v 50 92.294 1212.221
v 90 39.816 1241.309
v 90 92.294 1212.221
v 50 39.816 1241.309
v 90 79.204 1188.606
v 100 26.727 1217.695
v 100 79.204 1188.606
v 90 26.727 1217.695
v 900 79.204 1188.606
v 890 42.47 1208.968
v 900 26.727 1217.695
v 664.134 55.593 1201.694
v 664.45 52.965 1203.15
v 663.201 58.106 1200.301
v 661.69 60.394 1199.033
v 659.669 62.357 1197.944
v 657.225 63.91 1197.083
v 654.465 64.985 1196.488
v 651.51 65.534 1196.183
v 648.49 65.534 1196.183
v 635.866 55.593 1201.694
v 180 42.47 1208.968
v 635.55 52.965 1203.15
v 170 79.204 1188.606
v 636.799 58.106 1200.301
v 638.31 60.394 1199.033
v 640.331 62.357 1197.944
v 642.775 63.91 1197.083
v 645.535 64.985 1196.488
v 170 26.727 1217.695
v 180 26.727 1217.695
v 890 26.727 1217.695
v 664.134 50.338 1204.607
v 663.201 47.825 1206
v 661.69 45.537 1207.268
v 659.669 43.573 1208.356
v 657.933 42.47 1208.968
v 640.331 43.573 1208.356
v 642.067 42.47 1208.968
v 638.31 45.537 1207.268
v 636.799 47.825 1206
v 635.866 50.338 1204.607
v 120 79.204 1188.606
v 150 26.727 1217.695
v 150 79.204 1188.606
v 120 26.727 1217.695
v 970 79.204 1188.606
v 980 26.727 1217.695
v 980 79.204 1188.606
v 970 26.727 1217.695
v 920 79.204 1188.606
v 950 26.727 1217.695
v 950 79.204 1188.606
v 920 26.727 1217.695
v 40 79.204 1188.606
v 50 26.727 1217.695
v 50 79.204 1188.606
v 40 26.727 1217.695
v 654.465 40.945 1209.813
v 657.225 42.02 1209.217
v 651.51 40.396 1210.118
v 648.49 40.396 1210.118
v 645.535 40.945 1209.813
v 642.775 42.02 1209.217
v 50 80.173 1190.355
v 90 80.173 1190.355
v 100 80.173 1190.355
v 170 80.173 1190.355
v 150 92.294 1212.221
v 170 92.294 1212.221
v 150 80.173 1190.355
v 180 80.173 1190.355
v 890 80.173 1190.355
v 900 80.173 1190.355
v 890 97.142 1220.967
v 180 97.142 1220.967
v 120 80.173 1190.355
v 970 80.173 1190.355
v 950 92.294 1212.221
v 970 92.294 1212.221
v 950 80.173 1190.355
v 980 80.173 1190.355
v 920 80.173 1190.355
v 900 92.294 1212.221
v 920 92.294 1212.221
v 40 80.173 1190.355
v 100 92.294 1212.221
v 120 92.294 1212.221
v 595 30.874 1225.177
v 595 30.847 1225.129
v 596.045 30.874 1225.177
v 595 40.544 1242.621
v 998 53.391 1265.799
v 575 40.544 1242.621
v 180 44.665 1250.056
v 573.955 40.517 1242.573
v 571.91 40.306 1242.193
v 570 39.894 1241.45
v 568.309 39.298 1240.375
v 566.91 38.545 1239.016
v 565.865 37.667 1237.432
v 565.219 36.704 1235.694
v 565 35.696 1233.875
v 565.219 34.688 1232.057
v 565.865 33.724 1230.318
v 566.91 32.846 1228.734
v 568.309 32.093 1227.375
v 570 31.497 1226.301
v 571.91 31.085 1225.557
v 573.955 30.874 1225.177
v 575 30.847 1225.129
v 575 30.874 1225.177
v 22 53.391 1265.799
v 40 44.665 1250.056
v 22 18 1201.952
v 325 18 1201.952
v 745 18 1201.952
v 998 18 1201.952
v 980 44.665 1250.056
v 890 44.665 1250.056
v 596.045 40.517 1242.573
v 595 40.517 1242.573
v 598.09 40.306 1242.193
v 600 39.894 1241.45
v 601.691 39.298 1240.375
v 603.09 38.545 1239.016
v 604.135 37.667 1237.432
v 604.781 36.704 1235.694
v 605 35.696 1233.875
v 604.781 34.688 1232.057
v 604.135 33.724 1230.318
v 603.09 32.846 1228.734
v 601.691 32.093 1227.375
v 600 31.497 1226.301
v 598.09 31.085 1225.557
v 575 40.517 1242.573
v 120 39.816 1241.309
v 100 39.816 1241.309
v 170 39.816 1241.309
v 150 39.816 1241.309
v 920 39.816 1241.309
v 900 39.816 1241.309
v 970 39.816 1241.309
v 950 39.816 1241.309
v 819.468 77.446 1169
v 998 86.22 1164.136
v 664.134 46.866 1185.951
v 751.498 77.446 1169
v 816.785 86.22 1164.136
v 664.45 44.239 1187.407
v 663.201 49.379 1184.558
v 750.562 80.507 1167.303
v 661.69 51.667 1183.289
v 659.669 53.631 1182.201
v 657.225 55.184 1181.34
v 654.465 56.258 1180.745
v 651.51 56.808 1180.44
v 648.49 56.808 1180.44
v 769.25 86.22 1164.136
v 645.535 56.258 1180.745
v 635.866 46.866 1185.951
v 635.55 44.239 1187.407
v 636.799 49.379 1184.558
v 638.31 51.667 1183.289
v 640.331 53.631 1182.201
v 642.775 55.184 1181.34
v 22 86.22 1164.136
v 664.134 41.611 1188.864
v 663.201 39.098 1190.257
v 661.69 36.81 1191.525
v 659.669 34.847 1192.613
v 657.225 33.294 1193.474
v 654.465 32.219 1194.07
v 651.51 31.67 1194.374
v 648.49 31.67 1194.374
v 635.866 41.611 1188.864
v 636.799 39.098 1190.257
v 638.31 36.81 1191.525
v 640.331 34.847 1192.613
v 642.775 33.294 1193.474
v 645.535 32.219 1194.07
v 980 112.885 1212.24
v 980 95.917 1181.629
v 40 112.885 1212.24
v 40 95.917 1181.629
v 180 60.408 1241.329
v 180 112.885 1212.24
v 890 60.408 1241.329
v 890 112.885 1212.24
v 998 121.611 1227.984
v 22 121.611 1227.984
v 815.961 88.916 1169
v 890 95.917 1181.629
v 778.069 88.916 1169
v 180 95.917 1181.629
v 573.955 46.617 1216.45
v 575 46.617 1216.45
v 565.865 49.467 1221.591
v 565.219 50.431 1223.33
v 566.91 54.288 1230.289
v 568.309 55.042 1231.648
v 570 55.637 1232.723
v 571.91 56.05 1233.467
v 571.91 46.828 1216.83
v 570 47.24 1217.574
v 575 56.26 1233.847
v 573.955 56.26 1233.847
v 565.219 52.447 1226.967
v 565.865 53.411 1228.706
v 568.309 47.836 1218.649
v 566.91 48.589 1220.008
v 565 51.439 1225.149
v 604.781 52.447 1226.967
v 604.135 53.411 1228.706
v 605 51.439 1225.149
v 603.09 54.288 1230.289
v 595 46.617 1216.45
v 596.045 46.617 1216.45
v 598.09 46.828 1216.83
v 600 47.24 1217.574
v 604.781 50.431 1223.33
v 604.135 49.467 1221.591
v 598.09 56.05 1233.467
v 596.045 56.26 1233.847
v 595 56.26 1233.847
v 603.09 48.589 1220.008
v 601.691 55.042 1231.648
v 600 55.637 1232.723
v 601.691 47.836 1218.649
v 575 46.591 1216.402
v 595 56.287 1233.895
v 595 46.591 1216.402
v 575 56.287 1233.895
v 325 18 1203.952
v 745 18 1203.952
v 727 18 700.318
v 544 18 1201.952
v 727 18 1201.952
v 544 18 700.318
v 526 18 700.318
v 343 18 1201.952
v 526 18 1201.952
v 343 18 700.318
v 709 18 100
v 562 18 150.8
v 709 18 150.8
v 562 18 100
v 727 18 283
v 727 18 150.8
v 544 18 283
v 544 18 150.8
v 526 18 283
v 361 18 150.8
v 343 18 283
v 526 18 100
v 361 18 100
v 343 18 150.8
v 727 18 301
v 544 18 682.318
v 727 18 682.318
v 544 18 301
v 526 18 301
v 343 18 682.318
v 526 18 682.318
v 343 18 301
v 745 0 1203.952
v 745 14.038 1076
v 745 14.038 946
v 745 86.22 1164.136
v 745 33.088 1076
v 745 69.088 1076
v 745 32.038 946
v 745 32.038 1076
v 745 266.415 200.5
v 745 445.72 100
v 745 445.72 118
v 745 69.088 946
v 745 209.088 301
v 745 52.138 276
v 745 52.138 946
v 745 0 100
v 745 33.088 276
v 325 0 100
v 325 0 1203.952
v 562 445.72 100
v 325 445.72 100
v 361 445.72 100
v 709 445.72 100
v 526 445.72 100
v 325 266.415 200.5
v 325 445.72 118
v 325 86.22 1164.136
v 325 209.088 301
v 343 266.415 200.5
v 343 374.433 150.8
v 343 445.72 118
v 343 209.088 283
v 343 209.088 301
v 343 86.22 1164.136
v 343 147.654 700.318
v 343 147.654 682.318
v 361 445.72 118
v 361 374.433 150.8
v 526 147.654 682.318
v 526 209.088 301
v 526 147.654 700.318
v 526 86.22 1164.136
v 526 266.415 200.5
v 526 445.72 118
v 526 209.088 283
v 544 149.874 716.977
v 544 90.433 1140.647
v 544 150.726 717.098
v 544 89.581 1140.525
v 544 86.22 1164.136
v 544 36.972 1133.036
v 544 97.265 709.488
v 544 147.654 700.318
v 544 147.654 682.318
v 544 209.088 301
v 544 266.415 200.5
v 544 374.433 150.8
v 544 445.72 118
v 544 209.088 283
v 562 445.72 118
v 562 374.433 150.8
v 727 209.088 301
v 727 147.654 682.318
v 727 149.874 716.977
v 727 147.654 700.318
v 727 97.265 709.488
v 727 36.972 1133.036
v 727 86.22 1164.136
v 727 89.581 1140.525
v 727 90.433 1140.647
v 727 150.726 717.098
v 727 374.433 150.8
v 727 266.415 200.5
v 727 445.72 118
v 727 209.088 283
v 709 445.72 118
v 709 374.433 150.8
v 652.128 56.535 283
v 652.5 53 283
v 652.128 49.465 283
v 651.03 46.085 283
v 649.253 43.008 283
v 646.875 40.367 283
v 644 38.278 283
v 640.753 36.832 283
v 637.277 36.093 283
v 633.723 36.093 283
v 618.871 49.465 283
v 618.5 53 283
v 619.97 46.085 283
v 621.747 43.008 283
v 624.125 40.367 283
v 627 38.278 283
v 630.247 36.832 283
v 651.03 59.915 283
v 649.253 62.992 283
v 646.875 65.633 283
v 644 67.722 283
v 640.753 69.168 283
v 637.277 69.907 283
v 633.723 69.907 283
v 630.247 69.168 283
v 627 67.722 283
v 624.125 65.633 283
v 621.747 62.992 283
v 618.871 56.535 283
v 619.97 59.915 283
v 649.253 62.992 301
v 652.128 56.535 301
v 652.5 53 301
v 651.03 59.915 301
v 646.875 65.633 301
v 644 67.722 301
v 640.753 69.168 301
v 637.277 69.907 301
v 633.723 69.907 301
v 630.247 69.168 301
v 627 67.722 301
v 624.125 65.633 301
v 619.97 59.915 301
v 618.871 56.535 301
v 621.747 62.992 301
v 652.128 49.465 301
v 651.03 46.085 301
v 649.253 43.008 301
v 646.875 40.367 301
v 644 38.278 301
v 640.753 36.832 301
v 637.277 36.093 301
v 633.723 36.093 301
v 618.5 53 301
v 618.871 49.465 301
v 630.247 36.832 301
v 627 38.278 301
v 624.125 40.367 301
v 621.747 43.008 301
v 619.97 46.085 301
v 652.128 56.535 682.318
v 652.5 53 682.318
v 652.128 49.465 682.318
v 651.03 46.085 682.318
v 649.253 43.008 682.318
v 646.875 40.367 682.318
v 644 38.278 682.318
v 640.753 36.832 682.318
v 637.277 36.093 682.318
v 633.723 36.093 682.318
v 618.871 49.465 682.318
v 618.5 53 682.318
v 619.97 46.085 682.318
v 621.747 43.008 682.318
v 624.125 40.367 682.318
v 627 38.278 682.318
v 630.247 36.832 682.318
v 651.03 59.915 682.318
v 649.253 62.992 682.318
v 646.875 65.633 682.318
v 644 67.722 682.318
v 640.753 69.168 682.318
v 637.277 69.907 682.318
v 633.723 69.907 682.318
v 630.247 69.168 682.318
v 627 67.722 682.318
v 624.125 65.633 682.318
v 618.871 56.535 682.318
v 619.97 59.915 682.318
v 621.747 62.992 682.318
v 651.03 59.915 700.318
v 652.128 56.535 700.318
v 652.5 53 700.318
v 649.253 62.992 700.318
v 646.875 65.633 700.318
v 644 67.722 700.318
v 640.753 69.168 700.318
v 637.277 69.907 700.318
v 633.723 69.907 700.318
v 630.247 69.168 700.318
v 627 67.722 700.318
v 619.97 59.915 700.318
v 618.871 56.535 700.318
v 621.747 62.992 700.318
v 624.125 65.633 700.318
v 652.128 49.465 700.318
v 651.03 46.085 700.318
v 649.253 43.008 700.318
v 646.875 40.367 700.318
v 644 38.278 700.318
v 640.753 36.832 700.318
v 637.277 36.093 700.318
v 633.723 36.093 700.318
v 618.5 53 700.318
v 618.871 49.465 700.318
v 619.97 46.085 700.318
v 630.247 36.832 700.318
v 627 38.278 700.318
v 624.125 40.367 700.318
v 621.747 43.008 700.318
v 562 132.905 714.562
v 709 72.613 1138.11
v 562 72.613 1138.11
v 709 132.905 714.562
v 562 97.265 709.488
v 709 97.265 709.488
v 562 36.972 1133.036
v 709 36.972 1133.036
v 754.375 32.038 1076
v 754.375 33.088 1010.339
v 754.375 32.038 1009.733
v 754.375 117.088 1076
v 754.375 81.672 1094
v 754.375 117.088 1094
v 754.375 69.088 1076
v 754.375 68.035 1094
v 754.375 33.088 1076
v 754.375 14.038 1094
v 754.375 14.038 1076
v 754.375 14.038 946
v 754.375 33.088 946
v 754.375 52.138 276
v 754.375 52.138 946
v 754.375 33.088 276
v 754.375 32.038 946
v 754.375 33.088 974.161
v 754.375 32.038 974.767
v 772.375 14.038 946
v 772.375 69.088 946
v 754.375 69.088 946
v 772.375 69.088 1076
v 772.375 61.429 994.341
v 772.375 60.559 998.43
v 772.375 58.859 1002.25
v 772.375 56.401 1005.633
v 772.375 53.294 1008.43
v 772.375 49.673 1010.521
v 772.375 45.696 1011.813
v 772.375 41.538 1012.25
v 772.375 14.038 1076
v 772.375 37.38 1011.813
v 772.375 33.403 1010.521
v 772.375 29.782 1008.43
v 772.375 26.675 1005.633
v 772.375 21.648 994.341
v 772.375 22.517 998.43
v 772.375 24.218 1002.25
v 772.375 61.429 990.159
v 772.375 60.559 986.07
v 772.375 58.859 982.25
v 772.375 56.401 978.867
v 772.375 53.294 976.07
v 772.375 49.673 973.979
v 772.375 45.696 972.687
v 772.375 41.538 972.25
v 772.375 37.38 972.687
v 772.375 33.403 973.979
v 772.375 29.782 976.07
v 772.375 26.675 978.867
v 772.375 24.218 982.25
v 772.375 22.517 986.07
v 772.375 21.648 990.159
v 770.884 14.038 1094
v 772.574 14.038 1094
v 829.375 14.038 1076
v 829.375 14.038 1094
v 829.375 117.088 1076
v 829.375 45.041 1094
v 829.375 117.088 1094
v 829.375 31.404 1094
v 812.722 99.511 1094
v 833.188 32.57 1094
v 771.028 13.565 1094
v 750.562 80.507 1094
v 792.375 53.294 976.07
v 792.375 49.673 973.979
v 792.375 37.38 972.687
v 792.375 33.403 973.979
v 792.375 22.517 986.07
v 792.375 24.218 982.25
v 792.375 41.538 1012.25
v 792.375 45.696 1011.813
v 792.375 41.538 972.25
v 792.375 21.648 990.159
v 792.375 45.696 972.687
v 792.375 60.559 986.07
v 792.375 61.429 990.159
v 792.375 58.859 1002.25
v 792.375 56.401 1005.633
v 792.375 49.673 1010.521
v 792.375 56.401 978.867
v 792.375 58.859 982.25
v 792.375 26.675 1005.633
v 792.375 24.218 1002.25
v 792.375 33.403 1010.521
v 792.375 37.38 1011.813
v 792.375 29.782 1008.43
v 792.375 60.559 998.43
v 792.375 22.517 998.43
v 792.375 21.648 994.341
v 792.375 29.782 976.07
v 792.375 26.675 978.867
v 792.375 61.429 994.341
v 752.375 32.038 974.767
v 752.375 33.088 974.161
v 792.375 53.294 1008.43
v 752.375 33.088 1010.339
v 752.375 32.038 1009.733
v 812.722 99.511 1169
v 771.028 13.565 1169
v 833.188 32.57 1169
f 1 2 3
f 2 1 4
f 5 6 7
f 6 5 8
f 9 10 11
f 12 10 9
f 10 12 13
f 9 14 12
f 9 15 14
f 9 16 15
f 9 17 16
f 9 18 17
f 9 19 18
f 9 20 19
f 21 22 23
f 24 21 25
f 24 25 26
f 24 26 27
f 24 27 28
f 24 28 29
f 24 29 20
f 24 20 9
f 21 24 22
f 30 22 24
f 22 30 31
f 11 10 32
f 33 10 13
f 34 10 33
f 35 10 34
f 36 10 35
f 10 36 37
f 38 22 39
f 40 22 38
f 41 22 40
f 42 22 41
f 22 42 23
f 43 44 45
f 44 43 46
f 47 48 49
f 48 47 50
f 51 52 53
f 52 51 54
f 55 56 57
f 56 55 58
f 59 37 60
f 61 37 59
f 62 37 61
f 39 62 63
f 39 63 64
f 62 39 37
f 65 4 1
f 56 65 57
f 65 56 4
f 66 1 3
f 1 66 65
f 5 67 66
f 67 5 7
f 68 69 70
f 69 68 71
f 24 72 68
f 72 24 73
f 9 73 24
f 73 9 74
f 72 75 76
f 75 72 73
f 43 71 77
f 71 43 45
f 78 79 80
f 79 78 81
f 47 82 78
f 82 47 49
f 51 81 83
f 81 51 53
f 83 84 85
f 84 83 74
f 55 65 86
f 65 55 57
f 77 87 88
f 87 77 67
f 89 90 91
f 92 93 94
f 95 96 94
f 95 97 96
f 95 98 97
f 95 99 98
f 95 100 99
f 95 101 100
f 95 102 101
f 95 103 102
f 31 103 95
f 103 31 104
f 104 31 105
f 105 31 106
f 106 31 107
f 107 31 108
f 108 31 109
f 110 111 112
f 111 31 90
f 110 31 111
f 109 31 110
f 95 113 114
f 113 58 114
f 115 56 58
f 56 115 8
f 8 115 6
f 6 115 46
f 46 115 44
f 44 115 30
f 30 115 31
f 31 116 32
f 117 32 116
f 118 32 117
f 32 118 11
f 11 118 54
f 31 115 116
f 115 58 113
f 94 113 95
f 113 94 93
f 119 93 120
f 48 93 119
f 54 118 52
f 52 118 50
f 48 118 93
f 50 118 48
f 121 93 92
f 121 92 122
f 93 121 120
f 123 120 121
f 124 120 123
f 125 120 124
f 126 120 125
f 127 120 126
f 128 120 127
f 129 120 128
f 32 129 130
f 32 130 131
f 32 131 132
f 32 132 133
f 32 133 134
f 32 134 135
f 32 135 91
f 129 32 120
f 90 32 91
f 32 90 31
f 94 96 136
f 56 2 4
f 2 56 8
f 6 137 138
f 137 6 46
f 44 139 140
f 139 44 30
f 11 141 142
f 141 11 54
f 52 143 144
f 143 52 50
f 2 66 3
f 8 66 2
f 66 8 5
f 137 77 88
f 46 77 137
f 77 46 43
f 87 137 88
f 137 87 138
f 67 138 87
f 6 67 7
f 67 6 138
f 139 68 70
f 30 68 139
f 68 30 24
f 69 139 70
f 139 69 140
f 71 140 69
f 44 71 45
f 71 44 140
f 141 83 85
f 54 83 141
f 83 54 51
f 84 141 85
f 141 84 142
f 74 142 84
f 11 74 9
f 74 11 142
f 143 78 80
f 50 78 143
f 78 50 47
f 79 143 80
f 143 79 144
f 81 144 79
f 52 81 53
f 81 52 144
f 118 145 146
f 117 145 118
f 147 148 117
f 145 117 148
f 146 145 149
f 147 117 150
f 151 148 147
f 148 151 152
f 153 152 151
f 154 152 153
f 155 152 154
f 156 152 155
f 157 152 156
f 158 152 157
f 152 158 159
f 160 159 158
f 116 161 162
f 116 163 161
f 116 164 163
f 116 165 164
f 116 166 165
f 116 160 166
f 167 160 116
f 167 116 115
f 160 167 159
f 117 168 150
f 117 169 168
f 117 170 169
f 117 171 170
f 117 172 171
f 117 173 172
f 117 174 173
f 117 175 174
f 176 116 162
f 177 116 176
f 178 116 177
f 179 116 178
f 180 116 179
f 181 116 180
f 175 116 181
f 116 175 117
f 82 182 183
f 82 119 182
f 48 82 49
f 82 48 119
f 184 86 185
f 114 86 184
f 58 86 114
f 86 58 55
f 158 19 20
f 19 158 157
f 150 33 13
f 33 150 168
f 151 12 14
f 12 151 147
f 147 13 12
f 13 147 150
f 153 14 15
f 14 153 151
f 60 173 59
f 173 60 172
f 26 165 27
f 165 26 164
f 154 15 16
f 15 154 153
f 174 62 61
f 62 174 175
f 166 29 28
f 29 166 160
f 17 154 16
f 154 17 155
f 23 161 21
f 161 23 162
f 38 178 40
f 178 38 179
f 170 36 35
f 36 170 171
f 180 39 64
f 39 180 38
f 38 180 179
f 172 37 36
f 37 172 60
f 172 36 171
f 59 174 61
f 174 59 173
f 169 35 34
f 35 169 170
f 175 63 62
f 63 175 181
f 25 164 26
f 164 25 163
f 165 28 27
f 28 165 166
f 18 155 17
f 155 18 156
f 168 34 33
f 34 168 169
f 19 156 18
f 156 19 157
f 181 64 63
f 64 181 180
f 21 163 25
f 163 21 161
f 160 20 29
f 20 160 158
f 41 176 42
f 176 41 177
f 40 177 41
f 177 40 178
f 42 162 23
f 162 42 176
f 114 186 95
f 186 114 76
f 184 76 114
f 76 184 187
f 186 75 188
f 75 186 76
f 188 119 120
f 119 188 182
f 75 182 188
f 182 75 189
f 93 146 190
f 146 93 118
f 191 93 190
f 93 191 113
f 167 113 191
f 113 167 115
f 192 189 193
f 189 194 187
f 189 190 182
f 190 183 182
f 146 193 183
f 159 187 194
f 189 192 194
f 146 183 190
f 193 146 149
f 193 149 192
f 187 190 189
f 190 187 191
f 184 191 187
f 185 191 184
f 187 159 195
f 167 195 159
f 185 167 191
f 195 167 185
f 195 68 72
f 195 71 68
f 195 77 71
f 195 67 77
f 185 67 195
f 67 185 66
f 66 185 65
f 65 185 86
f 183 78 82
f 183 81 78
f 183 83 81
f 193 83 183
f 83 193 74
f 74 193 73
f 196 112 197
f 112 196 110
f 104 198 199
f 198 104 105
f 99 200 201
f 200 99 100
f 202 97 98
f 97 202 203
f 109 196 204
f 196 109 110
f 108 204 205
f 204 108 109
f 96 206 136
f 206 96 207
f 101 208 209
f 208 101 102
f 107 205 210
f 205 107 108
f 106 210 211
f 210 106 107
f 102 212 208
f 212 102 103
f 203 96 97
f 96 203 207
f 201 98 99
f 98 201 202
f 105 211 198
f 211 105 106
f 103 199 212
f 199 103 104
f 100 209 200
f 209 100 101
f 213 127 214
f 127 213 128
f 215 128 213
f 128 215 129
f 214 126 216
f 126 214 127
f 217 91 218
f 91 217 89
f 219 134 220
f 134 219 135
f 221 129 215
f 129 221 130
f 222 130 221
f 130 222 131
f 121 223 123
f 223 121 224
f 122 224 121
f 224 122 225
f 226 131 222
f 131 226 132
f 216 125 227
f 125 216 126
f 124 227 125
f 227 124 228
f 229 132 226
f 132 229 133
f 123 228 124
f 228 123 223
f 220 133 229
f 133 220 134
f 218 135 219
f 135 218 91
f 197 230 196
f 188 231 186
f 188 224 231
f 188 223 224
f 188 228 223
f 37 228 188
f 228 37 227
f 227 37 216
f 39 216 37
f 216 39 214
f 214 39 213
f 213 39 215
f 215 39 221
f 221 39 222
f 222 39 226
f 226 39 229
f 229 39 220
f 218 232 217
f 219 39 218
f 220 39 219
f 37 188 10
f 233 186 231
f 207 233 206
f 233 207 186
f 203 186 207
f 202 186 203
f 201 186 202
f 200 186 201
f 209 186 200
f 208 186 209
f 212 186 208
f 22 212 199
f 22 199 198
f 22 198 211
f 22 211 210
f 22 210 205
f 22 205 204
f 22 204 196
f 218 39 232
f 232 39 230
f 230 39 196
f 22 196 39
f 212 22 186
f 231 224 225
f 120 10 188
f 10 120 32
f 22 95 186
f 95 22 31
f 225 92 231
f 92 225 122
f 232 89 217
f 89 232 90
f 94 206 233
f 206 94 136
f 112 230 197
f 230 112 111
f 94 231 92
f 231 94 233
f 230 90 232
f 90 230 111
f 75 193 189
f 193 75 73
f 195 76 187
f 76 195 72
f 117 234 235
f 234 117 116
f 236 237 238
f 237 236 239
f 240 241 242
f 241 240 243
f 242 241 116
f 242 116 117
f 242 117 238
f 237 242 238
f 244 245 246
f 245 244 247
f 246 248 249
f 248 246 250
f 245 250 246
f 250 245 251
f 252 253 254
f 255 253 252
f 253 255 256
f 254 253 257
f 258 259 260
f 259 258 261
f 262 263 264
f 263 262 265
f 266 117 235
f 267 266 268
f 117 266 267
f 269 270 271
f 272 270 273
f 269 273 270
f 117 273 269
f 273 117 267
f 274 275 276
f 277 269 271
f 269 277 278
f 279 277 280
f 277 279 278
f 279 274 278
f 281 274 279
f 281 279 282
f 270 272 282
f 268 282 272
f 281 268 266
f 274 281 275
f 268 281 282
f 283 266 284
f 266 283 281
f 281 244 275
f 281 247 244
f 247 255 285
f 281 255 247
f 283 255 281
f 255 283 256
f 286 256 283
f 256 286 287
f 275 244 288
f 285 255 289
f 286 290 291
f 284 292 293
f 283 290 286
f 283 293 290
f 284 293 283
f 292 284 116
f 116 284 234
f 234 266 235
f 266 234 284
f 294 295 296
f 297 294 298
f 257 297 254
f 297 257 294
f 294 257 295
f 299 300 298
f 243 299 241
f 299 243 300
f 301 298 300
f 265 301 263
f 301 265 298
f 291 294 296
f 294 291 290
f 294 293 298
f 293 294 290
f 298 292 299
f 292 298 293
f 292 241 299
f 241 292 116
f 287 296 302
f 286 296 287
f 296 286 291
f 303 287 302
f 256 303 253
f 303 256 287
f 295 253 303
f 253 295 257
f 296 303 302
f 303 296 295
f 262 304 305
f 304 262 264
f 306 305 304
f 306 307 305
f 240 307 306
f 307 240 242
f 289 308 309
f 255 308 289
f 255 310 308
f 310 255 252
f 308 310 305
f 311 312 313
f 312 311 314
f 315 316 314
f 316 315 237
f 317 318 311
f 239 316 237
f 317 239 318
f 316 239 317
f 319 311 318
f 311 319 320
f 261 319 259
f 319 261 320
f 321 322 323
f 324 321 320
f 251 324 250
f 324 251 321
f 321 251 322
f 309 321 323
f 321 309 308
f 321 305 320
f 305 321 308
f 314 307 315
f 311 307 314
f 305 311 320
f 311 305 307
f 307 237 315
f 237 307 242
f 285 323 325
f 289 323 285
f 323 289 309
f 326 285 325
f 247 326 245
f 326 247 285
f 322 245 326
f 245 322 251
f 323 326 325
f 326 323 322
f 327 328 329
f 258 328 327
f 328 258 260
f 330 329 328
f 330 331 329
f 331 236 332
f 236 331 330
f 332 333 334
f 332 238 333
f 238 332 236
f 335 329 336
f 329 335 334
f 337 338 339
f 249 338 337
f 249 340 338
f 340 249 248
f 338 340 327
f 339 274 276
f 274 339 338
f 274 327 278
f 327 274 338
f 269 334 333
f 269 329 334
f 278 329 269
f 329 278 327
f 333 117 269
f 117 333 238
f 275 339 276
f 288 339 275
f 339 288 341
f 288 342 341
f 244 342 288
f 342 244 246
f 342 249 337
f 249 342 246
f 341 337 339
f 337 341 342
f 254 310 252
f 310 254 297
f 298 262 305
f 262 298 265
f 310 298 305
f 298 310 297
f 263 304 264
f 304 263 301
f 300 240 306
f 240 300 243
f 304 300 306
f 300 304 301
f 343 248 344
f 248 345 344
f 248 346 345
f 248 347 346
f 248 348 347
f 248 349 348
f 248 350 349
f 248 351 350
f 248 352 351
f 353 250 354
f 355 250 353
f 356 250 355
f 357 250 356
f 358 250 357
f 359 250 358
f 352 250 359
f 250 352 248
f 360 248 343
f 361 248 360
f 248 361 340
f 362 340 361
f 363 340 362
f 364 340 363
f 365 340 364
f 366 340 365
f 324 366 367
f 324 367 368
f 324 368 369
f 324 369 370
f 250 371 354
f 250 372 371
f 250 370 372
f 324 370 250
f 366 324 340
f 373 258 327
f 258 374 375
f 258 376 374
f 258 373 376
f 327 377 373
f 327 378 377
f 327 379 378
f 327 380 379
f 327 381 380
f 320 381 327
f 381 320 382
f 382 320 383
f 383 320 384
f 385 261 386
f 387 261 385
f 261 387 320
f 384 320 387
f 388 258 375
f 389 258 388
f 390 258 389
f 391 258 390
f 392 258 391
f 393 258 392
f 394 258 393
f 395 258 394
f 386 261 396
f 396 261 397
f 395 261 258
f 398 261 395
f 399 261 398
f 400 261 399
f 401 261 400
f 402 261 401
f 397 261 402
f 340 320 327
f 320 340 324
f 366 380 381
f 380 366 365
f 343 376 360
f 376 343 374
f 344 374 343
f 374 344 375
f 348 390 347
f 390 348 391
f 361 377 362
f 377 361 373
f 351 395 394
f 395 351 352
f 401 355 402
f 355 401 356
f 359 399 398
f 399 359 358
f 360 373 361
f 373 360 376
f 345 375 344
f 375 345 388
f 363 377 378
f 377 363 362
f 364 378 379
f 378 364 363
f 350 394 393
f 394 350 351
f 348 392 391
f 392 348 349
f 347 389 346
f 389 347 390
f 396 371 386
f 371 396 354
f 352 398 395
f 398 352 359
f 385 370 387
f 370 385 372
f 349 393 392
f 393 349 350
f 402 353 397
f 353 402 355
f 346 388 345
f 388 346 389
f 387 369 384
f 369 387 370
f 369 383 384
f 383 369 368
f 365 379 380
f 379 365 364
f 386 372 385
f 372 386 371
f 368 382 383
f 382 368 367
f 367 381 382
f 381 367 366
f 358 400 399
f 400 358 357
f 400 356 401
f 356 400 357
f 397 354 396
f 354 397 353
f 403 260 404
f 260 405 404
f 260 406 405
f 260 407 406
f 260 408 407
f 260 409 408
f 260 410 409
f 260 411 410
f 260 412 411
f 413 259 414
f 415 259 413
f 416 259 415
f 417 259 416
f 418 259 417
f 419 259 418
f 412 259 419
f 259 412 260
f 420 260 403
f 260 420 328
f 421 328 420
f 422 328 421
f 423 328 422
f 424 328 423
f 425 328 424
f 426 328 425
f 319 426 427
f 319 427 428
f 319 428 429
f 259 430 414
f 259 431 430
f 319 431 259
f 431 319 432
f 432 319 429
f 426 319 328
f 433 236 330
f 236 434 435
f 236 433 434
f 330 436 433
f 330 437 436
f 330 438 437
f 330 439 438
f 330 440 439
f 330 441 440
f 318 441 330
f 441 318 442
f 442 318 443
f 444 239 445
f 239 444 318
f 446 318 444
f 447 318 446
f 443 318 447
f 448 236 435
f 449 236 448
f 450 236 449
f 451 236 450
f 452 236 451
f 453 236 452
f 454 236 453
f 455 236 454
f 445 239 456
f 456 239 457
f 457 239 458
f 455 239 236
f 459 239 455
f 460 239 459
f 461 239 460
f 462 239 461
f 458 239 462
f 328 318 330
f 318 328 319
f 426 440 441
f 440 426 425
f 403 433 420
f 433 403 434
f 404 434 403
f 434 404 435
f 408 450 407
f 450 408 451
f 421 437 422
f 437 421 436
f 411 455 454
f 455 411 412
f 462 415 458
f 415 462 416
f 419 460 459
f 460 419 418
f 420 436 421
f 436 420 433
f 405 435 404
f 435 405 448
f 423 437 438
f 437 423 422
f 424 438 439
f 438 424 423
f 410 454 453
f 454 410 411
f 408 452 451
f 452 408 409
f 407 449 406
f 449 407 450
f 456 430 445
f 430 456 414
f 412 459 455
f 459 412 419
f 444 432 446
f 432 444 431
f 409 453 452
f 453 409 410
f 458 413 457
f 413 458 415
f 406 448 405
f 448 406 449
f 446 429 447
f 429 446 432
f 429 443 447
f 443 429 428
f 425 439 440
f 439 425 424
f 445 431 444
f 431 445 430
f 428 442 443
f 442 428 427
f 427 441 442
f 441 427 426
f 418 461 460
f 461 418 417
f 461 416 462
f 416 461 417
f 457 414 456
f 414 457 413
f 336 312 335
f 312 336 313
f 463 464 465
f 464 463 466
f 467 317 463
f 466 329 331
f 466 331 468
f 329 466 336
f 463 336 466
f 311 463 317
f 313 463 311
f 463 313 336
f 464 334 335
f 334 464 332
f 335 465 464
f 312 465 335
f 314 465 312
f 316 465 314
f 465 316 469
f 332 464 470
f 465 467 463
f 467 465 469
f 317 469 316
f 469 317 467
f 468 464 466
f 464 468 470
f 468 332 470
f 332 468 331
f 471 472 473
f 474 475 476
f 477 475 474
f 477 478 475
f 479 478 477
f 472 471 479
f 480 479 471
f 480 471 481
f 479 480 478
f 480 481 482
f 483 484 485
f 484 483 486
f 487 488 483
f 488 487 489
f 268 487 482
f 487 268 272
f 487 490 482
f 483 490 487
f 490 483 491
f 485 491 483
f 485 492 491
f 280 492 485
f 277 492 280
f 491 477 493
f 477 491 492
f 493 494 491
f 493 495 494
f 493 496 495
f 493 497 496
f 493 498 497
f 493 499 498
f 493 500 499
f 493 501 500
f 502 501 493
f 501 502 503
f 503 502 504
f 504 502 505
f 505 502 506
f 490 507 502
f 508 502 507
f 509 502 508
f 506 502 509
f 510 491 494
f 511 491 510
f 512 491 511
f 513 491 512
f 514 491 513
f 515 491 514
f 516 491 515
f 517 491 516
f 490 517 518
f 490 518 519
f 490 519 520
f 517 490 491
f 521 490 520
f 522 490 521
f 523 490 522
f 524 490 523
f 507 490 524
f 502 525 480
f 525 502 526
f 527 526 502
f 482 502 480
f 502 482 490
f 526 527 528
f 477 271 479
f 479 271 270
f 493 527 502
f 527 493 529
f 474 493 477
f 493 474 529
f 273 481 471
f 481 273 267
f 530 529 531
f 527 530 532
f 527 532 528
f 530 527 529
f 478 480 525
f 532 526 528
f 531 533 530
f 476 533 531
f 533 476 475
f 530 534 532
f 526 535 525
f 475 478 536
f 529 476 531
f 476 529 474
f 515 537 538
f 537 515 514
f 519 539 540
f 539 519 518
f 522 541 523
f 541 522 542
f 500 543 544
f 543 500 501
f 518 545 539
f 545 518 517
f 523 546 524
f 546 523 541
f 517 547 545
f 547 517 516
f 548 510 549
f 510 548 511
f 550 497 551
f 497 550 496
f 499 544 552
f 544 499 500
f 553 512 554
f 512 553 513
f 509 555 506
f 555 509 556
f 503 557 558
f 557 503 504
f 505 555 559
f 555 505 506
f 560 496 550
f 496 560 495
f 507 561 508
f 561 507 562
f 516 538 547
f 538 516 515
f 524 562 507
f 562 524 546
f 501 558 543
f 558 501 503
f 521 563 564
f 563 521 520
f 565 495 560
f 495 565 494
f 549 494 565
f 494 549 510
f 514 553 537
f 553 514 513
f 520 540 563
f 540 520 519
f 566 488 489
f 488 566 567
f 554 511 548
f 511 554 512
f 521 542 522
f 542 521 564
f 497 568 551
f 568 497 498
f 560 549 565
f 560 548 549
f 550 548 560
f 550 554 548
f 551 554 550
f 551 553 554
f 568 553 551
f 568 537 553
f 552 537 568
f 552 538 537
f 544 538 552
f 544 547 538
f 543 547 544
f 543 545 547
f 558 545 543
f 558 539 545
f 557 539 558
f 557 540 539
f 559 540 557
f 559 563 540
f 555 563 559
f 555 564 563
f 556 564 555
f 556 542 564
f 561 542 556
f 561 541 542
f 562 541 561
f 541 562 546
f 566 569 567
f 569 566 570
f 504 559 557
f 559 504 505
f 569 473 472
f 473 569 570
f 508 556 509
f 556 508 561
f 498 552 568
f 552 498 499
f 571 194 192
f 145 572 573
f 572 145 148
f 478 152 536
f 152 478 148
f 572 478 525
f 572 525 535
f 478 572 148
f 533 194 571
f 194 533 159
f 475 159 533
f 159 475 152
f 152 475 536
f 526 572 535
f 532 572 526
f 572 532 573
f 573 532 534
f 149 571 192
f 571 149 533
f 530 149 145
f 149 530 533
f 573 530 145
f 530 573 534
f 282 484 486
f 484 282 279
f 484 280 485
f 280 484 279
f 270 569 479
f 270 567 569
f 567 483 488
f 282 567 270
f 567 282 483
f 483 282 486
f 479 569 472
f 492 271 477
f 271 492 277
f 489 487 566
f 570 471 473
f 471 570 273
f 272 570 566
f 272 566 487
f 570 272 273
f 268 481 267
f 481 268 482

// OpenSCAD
// file: params.scad
sheet_thickness=18;				// thickness of the plywood sheet.
milling_bit=10;                 // size of the milling it (3/8 ~= 10mm)

laser_width=20;					// width of the laser
laser_height=27;				// height of the laser
laser_origin_height=16;			// center of the laser beam
laser_length=60;				// length of the laser (includes cable allowance).
laser_spread_angle = 2*atan((110/2)/60);	// angle the laser spreads out from origin.
plug_diameter = 34;

laser_setback        =  48.45*10-75;	// how much the laser is set back from the center of the bike.
laser_position_z     = 119.26*10-90;	// height of the laser center.
laser_position_angle =  29;		// angle the laser points down.

laser_low = 50;
laser_high=1350;

laser_y = laser_length;

wheel_width=34;					// maximum width of a wheel (space between the wheel channels).
wheel_height=670;				// height of a 700CC wheel.

handlebar_width_max = 500;
channel_offset = handlebar_width_max / 2 + 20;
channel_thickness = 50;         // Thickness of the channels on either side of the week_width.

base_length=1500;

hb_85=50+laser_width/2;			// position of handlebar 85cm line (centered on laser)
hb_83=hb_85+20;					// position of handlebar 83cm line
hb_80=hb_85+50;					// position of handlebar 80cm line
hb_75=hb_80+50;					// position of handlebar 75cm line

bb_0=hb_75+750;					// position of bottom bracket line
bb_5=bb_0+50;					// position of bottom bracket +5cm line

// castor dimensions GD-60F (2" wheel, leveling castor).
castor_height = 82;
castor_radius = 61;
castor_plate = 73;

// bottom of the jig from the floor.
base_bottom = sheet_thickness + castor_height;

tab_height = 2*25.4;	// Height of the tabs to attach the column and back.

// utility functions.

function rotate_point(p,a) = [p[0]*cos(a) - p[1]*sin(a), p[0]*sin(a) + p[1]*cos(a)];

// output the sheet thickness so export.py knows how to created the files.
echo( sheet_thickness=sheet_thickness );

// Global flag indicating to color the parts and background.
color_parts = true;
// file: thickness.scad
include <params.scad>
include <lasercut/lasercut.scad>

module thickness_in_z( thickness ) {
	children();
}

module thickness_in_y( thickness ) {
	translate( [0, thickness, 0] )
	rotate( [90,0,0] )
	children();
}

module thickness_in_x( thickness ) {
	rotate( [90,0,90] )
	children();
}

module cutCube(cube,
        simple_tabs=[], simple_tab_holes=[], 
        captive_nuts=[], captive_nut_holes = [],
        finger_joints = [],
        bumpy_finger_joints = [],
        screw_tabs=[], screw_tab_holes=[],
        twist_holes=[], twist_connect=[],
        clips=[], clip_holes=[],
        circles_add = [],
        circles_remove = [],
        slits = [],
        cutouts = [],
        cutouts_vb = [],
        flat_adjust = [],
        milling_bit = milling_bit
) {
    transVal = cube[1] == sheet_thickness ? [0,sheet_thickness,0] : [0,0,0];
    rotVal = cube[0] == sheet_thickness ? [90,0,90] : cube[1] == sheet_thickness ? [90,0,0] : [0,0,0];
    
    values = [ for( v = cube ) if( v != sheet_thickness ) v ];
    
    translate( transVal )
    rotate( rotVal )
    lasercutoutSquare(
        thickness=sheet_thickness,
        x=values[0], y=values[1],
        simple_tabs = simple_tabs, 
        simple_tab_holes = simple_tab_holes, 
        captive_nuts = captive_nuts, 
        captive_nut_holes = captive_nut_holes,
        finger_joints = finger_joints,
        bumpy_finger_joints = bumpy_finger_joints,
        screw_tabs= screw_tabs, screw_tab_holes= screw_tab_holes,
        twist_holes=twist_holes, twist_connect=twist_connect,
        clips=clips, clip_holes=clip_holes,
        circles_add = circles_add,
        circles_remove = circles_remove,
        slits = slits,
        cutouts = cutouts,
        cutouts_vb = cutouts_vb,
        flat_adjust = flat_adjust,
        milling_bit = milling_bit
    );
}

module cutPoints(points,
        simple_tabs=[], simple_tab_holes=[], 
        captive_nuts=[], captive_nut_holes = [],
        finger_joints = [],
        bumpy_finger_joints = [],
        screw_tabs=[], screw_tab_holes=[],
        twist_holes=[], twist_connect=[],
        clips=[], clip_holes=[],
        circles_add = [],
        circles_remove = [],
        slits = [],
        cutouts = [],
        cutouts_vb = [],
        flat_adjust = [],
        milling_bit = milling_bit
) {
    lasercutout(
        thickness=sheet_thickness,
        points=points,
        simple_tabs = simple_tabs, 
        simple_tab_holes = simple_tab_holes, 
        captive_nuts = captive_nuts, 
        captive_nut_holes = captive_nut_holes,
        finger_joints = finger_joints,
        bumpy_finger_joints = bumpy_finger_joints,
        screw_tabs= screw_tabs, screw_tab_holes= screw_tab_holes,
        twist_holes=twist_holes, twist_connect=twist_connect,
        clips=clips, clip_holes=clip_holes,
        circles_add = circles_add,
        circles_remove = circles_remove,
        slits = slits,
        cutouts = cutouts,
        cutouts_vb = cutouts_vb,
        flat_adjust = flat_adjust,
        milling_bit = milling_bit
    );
}
// file: lasers.scad
include <params.scad>
include <thickness.scad>

show_laser_lines = false;

laser_clearance = 10;   // Clearance around the laser modules.
lasers_x = hb_85-laser_width/2-laser_clearance-sheet_thickness;
lasers_margin = laser_width/2+laser_clearance+sheet_thickness;
lasers_length = (bb_5-hb_85)+2*lasers_margin;
lasers_height = sheet_thickness*2 + laser_height + laser_clearance;
lasers_width = laser_length+sheet_thickness;

lasers_back_yz = rotate_point( [-laser_length, -laser_origin_height-sheet_thickness],
                    -laser_position_angle );
lasers_front_yz = rotate_point( [sheet_thickness, -laser_origin_height-sheet_thickness],
                    -laser_position_angle );
                    
lasers_effective_width = abs(lasers_back_yz[0]-lasers_front_yz[0]);

base_width =
    sheet_thickness +
    abs(lasers_back_yz[0]) + laser_setback +
    channel_offset +
    sheet_thickness;
 
back_height_over = 5;
back_height=(laser_setback + channel_offset) * tan(laser_spread_angle/2 - laser_position_angle) + laser_position_z + back_height_over;
    
channel_center = base_width - sheet_thickness + channel_offset;

module lasers() {
    translate( [lasers_x, sheet_thickness+abs(lasers_back_yz[0]), base_bottom+laser_position_z] )
    rotate( [-laser_position_angle, 0, 0] )
    translate( [0,-(lasers_width-sheet_thickness),-(laser_origin_height+sheet_thickness)] ) {
        // Draw the laser modules.
        laser_start = sheet_thickness+laser_clearance;
        laser = [laser_width, laser_length, laser_height];
        translate( [laser_start, 0, sheet_thickness] ) {
            lps = [hb_85-hb_85, hb_83-hb_85, hb_80-hb_85, hb_75-hb_85, bb_0-hb_85, bb_5-hb_85];
            for( lp = lps ) {
                translate( [lp, 0, 0] )
                color( [1,.5,0] )
                cube( laser );
            }
        }
        
        color( [.9,.9,.9] ) {
            //------------------------------------------
            lasers_bottom = [lasers_length-sheet_thickness*2, laser_length, sheet_thickness];
            echo( lasers_bottom=lasers_bottom );
            
            translate( [sheet_thickness, 0, 0] )
            cutCube(
                lasers_bottom,
                circles_remove = [[0.85*plug_diameter/2, bb_0-300, lasers_bottom[1]/2]]
            );
            
            //------------------------------------------
            lasers_top = [lasers_length, lasers_width, sheet_thickness];
            echo( lasers_top=lasers_top );
            
            translate( [0, 0, lasers_height-sheet_thickness] )
            cutCube( lasers_top );
            
            //------------------------------------------
            lip = 2;
            lasers_front = [lasers_length-sheet_thickness*2, sheet_thickness, sheet_thickness+lip];
            echo( lasers_front=lasers_front );

            translate( [sheet_thickness, lasers_width-sheet_thickness, 0] )
            cutCube( lasers_front );
            
            //------------------------------------------
            lasers_end = [sheet_thickness, lasers_width, lasers_height-sheet_thickness];
            echo( "2x", lasers_end=lasers_end );
            
            translate( [0,0,0] )
            cutCube( lasers_end );

            translate( [lasers_length-sheet_thickness,0,0] )
            cutCube( lasers_end );
 
            //------------------------------------------
            laser_side_start = lasers_margin + (hb_75 - hb_85) + laser_width/2 + laser_clearance;
            laser_side_end = lasers_length - lasers_margin - (bb_5-bb_0) - laser_width/2 - laser_clearance;
            laser_side = [laser_side_end-laser_side_start, sheet_thickness, lasers_height-sheet_thickness*2];
            
            echo( laser_side_start=laser_side_start );
            echo( "2x", laser_side=laser_side );
            
            control_radius = 20.0/2;
            control_tab_start = laser_side[0]/2+40;
            control_tab_end = control_tab_start + control_radius*2;
            translate( [laser_side_start, 0, sheet_thickness] )
            cutCube( laser_side,
                    circles_remove = [[control_radius, control_tab_start, laser_side[2]/2],
                    [control_radius, control_tab_end, laser_side[2]/2]
                    ],
                    cutouts=[
                        [control_tab_start,laser_side[2]/2-control_radius,control_tab_end-control_tab_start,control_radius*2 ],
                    ]
            );
            translate( [laser_side_start, lasers_width-sheet_thickness, sheet_thickness] )
            cutCube( laser_side );
        }
    }
}

module laser_lines() {
	a = laser_spread_angle/2+laser_position_angle;
	base_intersect = laser_position_z / tan( a );
	points = [
		[0,0],
		[-laser_position_z, base_intersect],
		[-laser_position_z, laser_setback + channel_offset],
		[back_height-laser_position_z-back_height_over, laser_setback + channel_offset],
	];
    y = base_width - sheet_thickness - channel_offset - laser_setback;  
    x = lasers_x+sheet_thickness+laser_clearance+laser_width/2;
    echo( laser_85=x ); // Position of 85cm laser from left edge.
	color( [0,1,0,.05] ) {
        translate( [x, y, laser_position_z + base_bottom] )
		for( lp = [hb_85-hb_85, hb_83-hb_85, hb_80-hb_85, hb_75-hb_85, bb_0-hb_85, bb_5-hb_85] ) {
			translate( [lp, 0, 0] )
			rotate( a=[0,270,0] )
			linear_extrude( height=1 )
			polygon( points );
		}
	}
}

lasers();
if( show_laser_lines ) {
	laser_lines();
}
// main file
include <lasers.scad>
include <thickness.scad>
include <lasercut/lasercut.scad>

laser_reveal = 165;
column_width = bb_0 - hb_75 - laser_reveal * 2;
column_height = laser_position_z+lasers_back_yz[1];

column_x = (bb_0+hb_75-column_width)/2;

laser_level_spread_angle = 110;

module horizontal_laser_line() {
	a = laser_level_spread_angle/2;
    y = 1000 * tan(a);
	points = [
		[0,0],
		[-y, 1000],
		[y, 1000],
	];
	color( [0,1,0,.05] ) {
        linear_extrude( height=1 )
        polygon( points );
	}
}

module horizontal_laser( x, p_bottom, p_top ) {
    track = [3/8*25, 3/4*25.4, 800];
    laser = [65, 70, 75];
    bolt_xy = [65/2, 40];
    laser_height = 45;
    
    rail_length = 130;
    shuttle_rail = [track[0], sheet_thickness, rail_length];
    shuttle_top = [sheet_thickness, sheet_thickness*2+track[1], shuttle_rail[2]];
    shelf_border = 10;
    laser_shelf = [laser[0]+shelf_border, laser[2]+shelf_border,sheet_thickness];
    shuttle_extension = [laser_shelf[0],sheet_thickness,100];
    shuttle_shelf = [laser[0]+shelf_border, shuttle_top[1]+30+sheet_thickness, sheet_thickness];
    
    dx = p_top[0] - p_bottom[0];
    dy = p_top[1] - p_bottom[1];
    angle = 0;
    
    fraction = 0.0;
    p_bottom_new = [p_bottom[0] + dx*fraction-140, p_bottom[1] + dy*fraction-25];
    
    echo( "shuttle_angle=", angle );
    echo( "shuttle_height=", p_bottom_new[0] );
    
    echo( "2x", shuttle_rail=shuttle_rail );
    echo( shuttle_top=shuttle_top );
    echo( shuttle_extension=shuttle_top );
    echo( laser_shelf=laser_shelf );
    echo( shuttle_shelf=shuttle_shelf );
        
    translate( [x,p_bottom_new[0],base_bottom+p_bottom_new[1]] ) {
        rotate( [angle,0,0] ) {
            color( [.25,.25,1] )
            translate( [0,-sheet_thickness, 0] )
            cube( track );
            
            //shuttle_height = track[2]/2;
            shuttle_height = track[2] - shuttle_rail[2];
            
            color( [.5,.5,.5] )
            translate( [0,0, shuttle_height] )
            cube( shuttle_rail );
                
            color( [.5,.5,.5] )
            translate( [0, -track[1] - sheet_thickness, shuttle_height] )
            cube( shuttle_rail );

            color( [1,1,1] )
            translate( [track[0], -track[1] - sheet_thickness, shuttle_height] )
            cutCube( shuttle_top );
            //cube( shuttle_top );

            translate( [track[0], -track[1] - sheet_thickness, shuttle_height+shuttle_rail[2]] ) {
                rotate( [-angle,0,0] ) {
                    color( [1,1,1] )
                    cutCube( shuttle_shelf );
                    
                    color( [0,0,0] )
                    translate( [sheet_thickness, shuttle_shelf[0]/2-10, -shuttle_height/8] )
                    rotate( [0,90,0] )
                    cylinder( h=40, r=20, center=true );

                    translate( [laser_shelf[0]/2,laser_shelf[1]/2, sheet_thickness+laser[2]/2] ) {
                        rotate( [0,0,17] ) {
                            color( [0,.75,1] )
                            cube( laser, center=true );
                        
                            translate([0, laser[1]/2, laser[2]*.25]) {
                                if(show_laser_lines ) {
                                    horizontal_laser_line();
                                }
                            }
                        }
                    }
                }
            }
        };
    };
}

module column() {
        // Add a lip on the column front for alignment.
    column_front = [column_width, sheet_thickness, column_height+2];
    
    echo( column_front=column_front );
    
    column_laser_x = laser_reveal + hb_75-hb_85 + laser_clearance + sheet_thickness;
    echo( column_laser_x=column_laser_x );
    
    echo( hb_85=hb_85 );
    
    column_support_break_y = (lasers_effective_width + laser_setback)/2.5;
    column_support_break_y2 = column_support_break_y*1.3;
    column_support_break_z = .15*wheel_height;
    column_support_break_z2 = .30*wheel_height;
    column_support_z2 = column_height-abs(lasers_back_yz[1]-lasers_front_yz[1]);
    column_support = [
        [0,0],
        [0,column_height],
        [lasers_effective_width,column_support_z2],
        [column_support_break_y,column_support_break_z2],
        [column_support_break_y2,column_support_break_z],
        [lasers_effective_width + laser_setback-channel_thickness,sheet_thickness],
        [lasers_effective_width + laser_setback-channel_thickness,0]
    ];
    echo( "3x", column_support=column_support );
       
    //---------------------------------------------------------------
    translate( [0, 0, base_bottom] ) {
        // Compute the tabs to attach the supports to the base.
        x_max = column_support[len(column_support)-1][0];
        y_tab = column_support[len(column_support)-3][1] - sheet_thickness;
        x_tab = x_max - column_support[len(column_support)-3][0];
        a_tab = atan( y_tab / x_tab );
        
        echo( column_x=column_x );
        translate( [column_x,0,0] )
        cutCube( column_front );
    
        col_suppport_tab = [
            [0,0],
            [0,tab_height],
            [x_max - (tab_height - sheet_thickness)/tan(a_tab),tab_height],
            [x_max,sheet_thickness],
            [x_max,0],
        ];
        echo( "3x", col_suppport_tab=col_suppport_tab );
        
        column_support_spacing = (column_width - sheet_thickness) / 2;
        translate( [column_x, sheet_thickness, 0] ) {
            for( i = [0:2] ) {
                translate([i*column_support_spacing,0,0])
                rotate([90,0,90])
                cutPoints( column_support );

                translate([i*column_support_spacing+(i==2?-sheet_thickness:sheet_thickness),0,0])
                rotate([90,0,90])
                cutPoints( col_suppport_tab );
            }
        }
        
        column_support_brace_1 = [
            (column_width - 3*sheet_thickness)/2,
            column_support_break_y,
            sheet_thickness
        ];
        column_support_brace_2 = [
            (column_width - 3*sheet_thickness)/2,
            (column_support_break_y+lasers_effective_width)/2,
            sheet_thickness
        ];
        echo( "2x", column_support_brace_1=column_support_brace_1 );
        echo( "2x", column_support_brace_2=column_support_brace_2 );
        
        column_support_brace_height_1 = column_support_break_z2-sheet_thickness;
        column_support_brace_height_2 = (column_support_z2+column_support_break_z)/2;
        echo( column_support_brace_height_1=column_support_brace_height_1,
            column_support_brace_height_2=column_support_brace_height_2 );
        
        color( [1,0,0,.2] )
        translate( [column_x, 0, 0] )
        for ( x = [sheet_thickness, (column_width+sheet_thickness)/2] ) {
            translate( [x, sheet_thickness, column_support_brace_height_1] )
            if( x != sheet_thickness ) {
                cutCube(
                    column_support_brace_1,
                    circles_remove=[[plug_diameter/2, column_support_brace_1[0]/2, sheet_thickness+plug_diameter/2]] );
            }
            else
                cutCube( column_support_brace_1 );

            translate( [x, sheet_thickness, column_support_brace_height_2] )
            if( x != sheet_thickness ) {
                cutCube(
                    column_support_brace_2,
                    circles_remove=[[plug_diameter/2, column_support_brace_2[0]/2, sheet_thickness+plug_diameter/2]] );
            }
            else
                cutCube( column_support_brace_2 );            
        }
        
        //----------------------------------------------------
        // Electronics box.
        //
        electronics_cover = [
            (column_width - 3*sheet_thickness)/2,
            sheet_thickness,
            (column_support_z2 - column_support_break_z)/2 - sheet_thickness*3,
        ];
        echo( electronics_cover=electronics_cover );
       
        electronics_cover_block = [
            sheet_thickness,
            sheet_thickness*2,
            electronics_cover[2]
        ];
        echo( "2x", electronics_cover_block=electronics_cover_block );
        
        // Draw the cover (pain!).
        xy0 = column_support[2];
        xy1 = column_support[3];
        x = xy1[0] - xy0[0];
        y = xy1[1] - xy0[1];
        a = atan( x/y );
        
        color( [0,1,1] )
        translate( [column_x + sheet_thickness*2 + electronics_cover[0], 0, xy0[1]] )
        rotate( [-a,0,0] ) {
            translate( [0, lasers_effective_width, -electronics_cover[2]-sheet_thickness*2] )
            cutCube( electronics_cover );
            
            translate( [0, lasers_effective_width - electronics_cover_block[1], -electronics_cover[2]-sheet_thickness*2] )
            cutCube( electronics_cover_block );
            
            translate( [electronics_cover[0]-sheet_thickness, lasers_effective_width - electronics_cover_block[1], -electronics_cover[2]-sheet_thickness*2] )
            cutCube( electronics_cover_block );
        }
    }
    
    horizontal_laser( column_x+column_width, column_support[3], column_support[2] );
}

// color( [1,1,1] )
column();
